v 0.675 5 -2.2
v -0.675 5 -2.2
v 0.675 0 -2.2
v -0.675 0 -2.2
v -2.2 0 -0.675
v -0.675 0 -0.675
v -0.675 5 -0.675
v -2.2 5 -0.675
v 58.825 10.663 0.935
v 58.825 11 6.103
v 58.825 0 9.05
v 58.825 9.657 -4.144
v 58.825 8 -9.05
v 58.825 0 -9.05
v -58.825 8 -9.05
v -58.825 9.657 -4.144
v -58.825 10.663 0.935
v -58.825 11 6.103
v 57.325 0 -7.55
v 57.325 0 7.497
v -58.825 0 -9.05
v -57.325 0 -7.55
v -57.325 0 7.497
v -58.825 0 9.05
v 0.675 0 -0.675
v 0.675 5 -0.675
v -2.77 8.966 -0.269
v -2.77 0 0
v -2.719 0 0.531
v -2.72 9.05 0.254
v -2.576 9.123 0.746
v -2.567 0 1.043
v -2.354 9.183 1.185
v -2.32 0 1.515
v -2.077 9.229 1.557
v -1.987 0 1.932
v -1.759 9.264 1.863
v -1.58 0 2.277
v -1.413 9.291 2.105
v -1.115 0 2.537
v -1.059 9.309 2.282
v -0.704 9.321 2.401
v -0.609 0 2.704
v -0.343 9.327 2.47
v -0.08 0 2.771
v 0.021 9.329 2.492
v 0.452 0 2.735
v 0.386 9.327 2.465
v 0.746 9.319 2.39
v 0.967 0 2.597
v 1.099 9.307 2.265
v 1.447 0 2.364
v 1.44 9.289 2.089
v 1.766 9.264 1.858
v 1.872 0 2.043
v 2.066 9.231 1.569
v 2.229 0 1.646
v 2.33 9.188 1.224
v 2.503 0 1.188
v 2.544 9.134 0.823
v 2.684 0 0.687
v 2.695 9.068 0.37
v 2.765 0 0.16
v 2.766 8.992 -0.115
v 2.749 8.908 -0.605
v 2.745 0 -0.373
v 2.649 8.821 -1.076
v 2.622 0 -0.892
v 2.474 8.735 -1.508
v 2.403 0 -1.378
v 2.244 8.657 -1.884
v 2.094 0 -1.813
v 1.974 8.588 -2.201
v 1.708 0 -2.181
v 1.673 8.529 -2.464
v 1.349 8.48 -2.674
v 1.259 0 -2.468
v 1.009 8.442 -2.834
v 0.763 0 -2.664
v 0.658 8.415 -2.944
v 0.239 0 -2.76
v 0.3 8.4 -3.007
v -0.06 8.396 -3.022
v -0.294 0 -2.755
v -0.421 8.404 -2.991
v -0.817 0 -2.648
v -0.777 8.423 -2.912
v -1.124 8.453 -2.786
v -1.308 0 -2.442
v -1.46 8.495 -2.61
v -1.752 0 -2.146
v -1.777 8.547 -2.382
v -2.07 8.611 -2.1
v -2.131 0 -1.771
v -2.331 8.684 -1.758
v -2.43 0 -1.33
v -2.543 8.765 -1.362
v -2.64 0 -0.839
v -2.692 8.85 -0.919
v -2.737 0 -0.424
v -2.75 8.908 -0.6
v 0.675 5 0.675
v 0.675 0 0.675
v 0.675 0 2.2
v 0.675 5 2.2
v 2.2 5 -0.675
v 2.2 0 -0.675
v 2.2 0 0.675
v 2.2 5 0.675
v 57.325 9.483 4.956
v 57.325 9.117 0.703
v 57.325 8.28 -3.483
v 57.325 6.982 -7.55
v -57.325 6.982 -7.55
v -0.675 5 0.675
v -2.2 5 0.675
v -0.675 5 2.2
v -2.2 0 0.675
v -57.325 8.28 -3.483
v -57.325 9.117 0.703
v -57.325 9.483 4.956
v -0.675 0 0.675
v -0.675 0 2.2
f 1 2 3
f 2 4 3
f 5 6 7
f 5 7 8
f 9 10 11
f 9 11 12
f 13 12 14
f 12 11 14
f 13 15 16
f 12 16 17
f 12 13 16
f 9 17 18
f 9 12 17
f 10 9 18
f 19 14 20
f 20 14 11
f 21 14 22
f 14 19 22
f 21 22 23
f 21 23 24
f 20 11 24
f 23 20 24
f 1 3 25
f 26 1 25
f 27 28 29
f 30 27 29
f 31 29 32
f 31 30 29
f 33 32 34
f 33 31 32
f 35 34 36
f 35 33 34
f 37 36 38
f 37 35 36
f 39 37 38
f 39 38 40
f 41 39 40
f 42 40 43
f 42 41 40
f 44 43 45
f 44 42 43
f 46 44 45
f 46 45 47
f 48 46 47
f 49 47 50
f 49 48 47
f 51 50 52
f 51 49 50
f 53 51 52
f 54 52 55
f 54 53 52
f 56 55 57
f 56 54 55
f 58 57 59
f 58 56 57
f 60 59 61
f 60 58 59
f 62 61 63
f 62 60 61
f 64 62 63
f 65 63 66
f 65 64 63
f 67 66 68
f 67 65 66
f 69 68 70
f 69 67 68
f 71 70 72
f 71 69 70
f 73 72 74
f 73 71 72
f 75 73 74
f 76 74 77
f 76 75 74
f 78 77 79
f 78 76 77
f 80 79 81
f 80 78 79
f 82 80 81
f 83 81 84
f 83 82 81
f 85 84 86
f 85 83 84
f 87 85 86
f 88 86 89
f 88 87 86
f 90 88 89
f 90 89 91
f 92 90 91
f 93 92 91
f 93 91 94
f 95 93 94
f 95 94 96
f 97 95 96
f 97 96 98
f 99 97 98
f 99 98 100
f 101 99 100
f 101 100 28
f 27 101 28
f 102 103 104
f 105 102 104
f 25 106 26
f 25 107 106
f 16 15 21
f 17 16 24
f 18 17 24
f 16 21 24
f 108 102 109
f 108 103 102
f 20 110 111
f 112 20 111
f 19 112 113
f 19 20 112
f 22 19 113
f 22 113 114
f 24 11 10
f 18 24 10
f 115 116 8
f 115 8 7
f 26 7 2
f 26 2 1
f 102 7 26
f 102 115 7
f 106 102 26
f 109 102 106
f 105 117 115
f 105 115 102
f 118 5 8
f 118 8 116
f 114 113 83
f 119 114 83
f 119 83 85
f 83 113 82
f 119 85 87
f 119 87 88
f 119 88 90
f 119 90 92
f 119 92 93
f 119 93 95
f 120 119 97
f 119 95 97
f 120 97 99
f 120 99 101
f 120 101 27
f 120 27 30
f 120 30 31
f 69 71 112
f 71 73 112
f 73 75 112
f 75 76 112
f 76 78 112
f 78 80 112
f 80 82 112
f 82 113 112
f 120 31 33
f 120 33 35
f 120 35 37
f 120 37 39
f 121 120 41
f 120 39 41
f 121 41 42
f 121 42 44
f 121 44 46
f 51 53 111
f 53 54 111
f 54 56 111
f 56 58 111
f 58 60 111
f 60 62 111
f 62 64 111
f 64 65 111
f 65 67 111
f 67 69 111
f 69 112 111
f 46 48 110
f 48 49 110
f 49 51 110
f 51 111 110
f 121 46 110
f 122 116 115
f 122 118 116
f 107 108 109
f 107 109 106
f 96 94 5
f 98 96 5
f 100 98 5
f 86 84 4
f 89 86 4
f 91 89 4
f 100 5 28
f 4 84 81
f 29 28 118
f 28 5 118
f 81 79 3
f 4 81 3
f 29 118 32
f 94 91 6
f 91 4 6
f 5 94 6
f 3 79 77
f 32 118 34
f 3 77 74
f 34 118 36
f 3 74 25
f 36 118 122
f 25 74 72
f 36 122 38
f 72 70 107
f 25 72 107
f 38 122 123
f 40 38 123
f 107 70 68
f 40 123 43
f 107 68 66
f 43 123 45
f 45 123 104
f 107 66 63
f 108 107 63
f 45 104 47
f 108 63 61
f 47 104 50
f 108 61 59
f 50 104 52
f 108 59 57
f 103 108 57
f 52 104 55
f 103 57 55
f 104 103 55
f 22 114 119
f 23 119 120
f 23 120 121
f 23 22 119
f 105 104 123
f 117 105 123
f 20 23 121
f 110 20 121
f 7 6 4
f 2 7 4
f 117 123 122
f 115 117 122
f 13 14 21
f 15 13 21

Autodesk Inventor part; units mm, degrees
ref_plane "YZ Plane" through (0, 0, 0) normal (1, 0, 0) x (0, 1, 0)
ref_plane "XZ Plane" through (0, 0, 0) normal (0, 1, 0) x (-1, 0, 0)
sketch "Spacebar base" plane through (0, 0, 0) normal (0, 1, 0) x (-1, 0, 0)
  line L0 (58.825, 9.05) -> (-58.825, 9.05)
  line L1 (-58.825, 9.05) -> (-58.825, -9.05)
  line L2 (-58.825, -9.05) -> (58.825, -9.05)
  line L3 (58.825, -9.05) -> (58.825, 9.05)
  line L4 (58.825, 9.05) -> (-58.825, -9.05) construction
  line L5 (-58.825, 9.05) -> (58.825, -9.05) construction
  point P0 (0, 0)
  dimension "d0" = 117.65
  dimension "d1" = 18.1
extrude "Spacebar Bulk" add sketch "Spacebar base" along normal blind 11
sketch "Curve Profile" plane through (58.825, 0, 9.05) normal (1, 0, 0) x (0, 0, -1)
  line L0 (0, 0) -> (18.1, 0) projected
  line L1 (0, 0) -> (2.9474, 11)
  line L2 (0, 11) -> (18.1, 11) projected
  line L3 (18.1, 0) -> (18.1, 11) projected
  arc A0 (18.1, 8) -> (2.9474, 11) centre (2.9474, -28.7667) ccw
  line L4 (0, 0) -> (0, 11) projected
  line L5 (18.1, 8) -> (18.1, 0)
  line L6 (18.1, 0) -> (0, 0)
  point P0 (9.05, 0)
  dimension "d4" = 15
  dimension "d9" = 8
extrude "Curve Cutaway" cut sketch "Curve Profile" against normal up to surface (117.65 mm away) contours L1 A0 L3 L0 keep common part
shell "Inner Shell" thickness 1.5 removed faces 1 at (19.6083, 0, 3.0167)
ref_plane "PoleBase Plane" through (57.325, 9.4828, 4.9562) normal (0, 0.9996, -0.03) x (-1, 0, 0)
sketch "Center Circle" plane through (57.325, 9.4828, 4.9562) normal (0, 0.9996, -0.03) x (-1, 0, 0)
  circle A0 centre (57.325, -5.238) radius 2.77
  dimension "d11" = 5.54
extrude "Pole Extrusion" add sketch "Center Circle" against normal up to surface surface through (0, 0, 0) normal (0, 1, 0)
sketch "Sketch4" plane through (0, 0, 0) normal (0, -1, 0) x (1, 0, 0)
  line L0 (-2.2, 0.675) -> (2.2, 0.675)
  line L1 (2.2, 0.675) -> (2.2, -0.675)
  line L2 (2.2, -0.675) -> (-2.2, -0.675)
  line L3 (-2.2, -0.675) -> (-2.2, 0.675)
  line L4 (-2.2, 0.675) -> (2.2, -0.675) construction
  line L5 (2.2, 0.675) -> (-2.2, -0.675) construction
  line L6 (0.675, 2.2) -> (-0.675, 2.2)
  line L7 (-0.675, 2.2) -> (-0.675, -2.2)
  line L8 (-0.675, -2.2) -> (0.675, -2.2)
  line L9 (0.675, -2.2) -> (0.675, 2.2)
  line L10 (0.675, 2.2) -> (-0.675, -2.2) construction
  line L11 (-0.675, 2.2) -> (0.675, -2.2) construction
  point P0 (0, 0)
  dimension "d14" = 4.4
  dimension "d15" = 1.35
  dimension "d16" = 1.35
  dimension "d17" = 4.4
extrude "Extrusion4" cut sketch "Sketch4" against normal blind 5
equation "\"d0\" = b_space"
equation "\"d1\" = k_width"
equation "\"d10\" = k_wthick"
equation "\"d11\" = k_poledia"
equation "\"d14\" = k_cmxl"
equation "\"d15\" = k_cmxw"
equation "\"d16\" = k_cmxw"
equation "\"d17\" = k_cmxl"
equation "\"k_width\" = 18.1"
equation "\"k_height\" = 18"
equation "\"k_height_t\" = 16"
equation "\"k_taper1\" = 1.5"
equation "\"k_taper2\" = 0.5"
equation "\"k_staper\" = 1"
equation "\"k_sradius\" = 4"
equation "\"k_ltaper\" = 1.5"
equation "\"k_lradius\" = 6"
equation "\"k_radius\" = 6"
equation "\"k_wthick\" = 1.5"
equation "\"k_ribthick\" = 1.5"
equation "\"k_ribheight\" = 5"
equation "\"k_poleoff\" = 2.2625"
equation "\"k_poledia\" = 5.54"
equation "\"k_cmxw\" = 1.35"
equation "\"k_cmxl\" = 4.4"
equation "\"s_bwidth\" = 15.6"
equation "\"s_poleh\" = 3.6"
equation "\"s_polebw\" = 5.5"
equation "\"s_polebl\" = 7"
equation "\"b_pad\" = 1"
equation "\"b_tab\" = 27.15"
equation "\"b_caps\" = 31.675"
equation "\"b_lshift\" = 40.725"
equation "\"b_rshift\" = 49.775"
equation "\"b_ctrl\" = 22.625"
equation "\"b_space\" = 117.65"
equation "\"b_width\" = 286.5"
equation "\"b_height\" = 77.4"
properties part number "spacebar-keycap_mockup_cherrymx"
